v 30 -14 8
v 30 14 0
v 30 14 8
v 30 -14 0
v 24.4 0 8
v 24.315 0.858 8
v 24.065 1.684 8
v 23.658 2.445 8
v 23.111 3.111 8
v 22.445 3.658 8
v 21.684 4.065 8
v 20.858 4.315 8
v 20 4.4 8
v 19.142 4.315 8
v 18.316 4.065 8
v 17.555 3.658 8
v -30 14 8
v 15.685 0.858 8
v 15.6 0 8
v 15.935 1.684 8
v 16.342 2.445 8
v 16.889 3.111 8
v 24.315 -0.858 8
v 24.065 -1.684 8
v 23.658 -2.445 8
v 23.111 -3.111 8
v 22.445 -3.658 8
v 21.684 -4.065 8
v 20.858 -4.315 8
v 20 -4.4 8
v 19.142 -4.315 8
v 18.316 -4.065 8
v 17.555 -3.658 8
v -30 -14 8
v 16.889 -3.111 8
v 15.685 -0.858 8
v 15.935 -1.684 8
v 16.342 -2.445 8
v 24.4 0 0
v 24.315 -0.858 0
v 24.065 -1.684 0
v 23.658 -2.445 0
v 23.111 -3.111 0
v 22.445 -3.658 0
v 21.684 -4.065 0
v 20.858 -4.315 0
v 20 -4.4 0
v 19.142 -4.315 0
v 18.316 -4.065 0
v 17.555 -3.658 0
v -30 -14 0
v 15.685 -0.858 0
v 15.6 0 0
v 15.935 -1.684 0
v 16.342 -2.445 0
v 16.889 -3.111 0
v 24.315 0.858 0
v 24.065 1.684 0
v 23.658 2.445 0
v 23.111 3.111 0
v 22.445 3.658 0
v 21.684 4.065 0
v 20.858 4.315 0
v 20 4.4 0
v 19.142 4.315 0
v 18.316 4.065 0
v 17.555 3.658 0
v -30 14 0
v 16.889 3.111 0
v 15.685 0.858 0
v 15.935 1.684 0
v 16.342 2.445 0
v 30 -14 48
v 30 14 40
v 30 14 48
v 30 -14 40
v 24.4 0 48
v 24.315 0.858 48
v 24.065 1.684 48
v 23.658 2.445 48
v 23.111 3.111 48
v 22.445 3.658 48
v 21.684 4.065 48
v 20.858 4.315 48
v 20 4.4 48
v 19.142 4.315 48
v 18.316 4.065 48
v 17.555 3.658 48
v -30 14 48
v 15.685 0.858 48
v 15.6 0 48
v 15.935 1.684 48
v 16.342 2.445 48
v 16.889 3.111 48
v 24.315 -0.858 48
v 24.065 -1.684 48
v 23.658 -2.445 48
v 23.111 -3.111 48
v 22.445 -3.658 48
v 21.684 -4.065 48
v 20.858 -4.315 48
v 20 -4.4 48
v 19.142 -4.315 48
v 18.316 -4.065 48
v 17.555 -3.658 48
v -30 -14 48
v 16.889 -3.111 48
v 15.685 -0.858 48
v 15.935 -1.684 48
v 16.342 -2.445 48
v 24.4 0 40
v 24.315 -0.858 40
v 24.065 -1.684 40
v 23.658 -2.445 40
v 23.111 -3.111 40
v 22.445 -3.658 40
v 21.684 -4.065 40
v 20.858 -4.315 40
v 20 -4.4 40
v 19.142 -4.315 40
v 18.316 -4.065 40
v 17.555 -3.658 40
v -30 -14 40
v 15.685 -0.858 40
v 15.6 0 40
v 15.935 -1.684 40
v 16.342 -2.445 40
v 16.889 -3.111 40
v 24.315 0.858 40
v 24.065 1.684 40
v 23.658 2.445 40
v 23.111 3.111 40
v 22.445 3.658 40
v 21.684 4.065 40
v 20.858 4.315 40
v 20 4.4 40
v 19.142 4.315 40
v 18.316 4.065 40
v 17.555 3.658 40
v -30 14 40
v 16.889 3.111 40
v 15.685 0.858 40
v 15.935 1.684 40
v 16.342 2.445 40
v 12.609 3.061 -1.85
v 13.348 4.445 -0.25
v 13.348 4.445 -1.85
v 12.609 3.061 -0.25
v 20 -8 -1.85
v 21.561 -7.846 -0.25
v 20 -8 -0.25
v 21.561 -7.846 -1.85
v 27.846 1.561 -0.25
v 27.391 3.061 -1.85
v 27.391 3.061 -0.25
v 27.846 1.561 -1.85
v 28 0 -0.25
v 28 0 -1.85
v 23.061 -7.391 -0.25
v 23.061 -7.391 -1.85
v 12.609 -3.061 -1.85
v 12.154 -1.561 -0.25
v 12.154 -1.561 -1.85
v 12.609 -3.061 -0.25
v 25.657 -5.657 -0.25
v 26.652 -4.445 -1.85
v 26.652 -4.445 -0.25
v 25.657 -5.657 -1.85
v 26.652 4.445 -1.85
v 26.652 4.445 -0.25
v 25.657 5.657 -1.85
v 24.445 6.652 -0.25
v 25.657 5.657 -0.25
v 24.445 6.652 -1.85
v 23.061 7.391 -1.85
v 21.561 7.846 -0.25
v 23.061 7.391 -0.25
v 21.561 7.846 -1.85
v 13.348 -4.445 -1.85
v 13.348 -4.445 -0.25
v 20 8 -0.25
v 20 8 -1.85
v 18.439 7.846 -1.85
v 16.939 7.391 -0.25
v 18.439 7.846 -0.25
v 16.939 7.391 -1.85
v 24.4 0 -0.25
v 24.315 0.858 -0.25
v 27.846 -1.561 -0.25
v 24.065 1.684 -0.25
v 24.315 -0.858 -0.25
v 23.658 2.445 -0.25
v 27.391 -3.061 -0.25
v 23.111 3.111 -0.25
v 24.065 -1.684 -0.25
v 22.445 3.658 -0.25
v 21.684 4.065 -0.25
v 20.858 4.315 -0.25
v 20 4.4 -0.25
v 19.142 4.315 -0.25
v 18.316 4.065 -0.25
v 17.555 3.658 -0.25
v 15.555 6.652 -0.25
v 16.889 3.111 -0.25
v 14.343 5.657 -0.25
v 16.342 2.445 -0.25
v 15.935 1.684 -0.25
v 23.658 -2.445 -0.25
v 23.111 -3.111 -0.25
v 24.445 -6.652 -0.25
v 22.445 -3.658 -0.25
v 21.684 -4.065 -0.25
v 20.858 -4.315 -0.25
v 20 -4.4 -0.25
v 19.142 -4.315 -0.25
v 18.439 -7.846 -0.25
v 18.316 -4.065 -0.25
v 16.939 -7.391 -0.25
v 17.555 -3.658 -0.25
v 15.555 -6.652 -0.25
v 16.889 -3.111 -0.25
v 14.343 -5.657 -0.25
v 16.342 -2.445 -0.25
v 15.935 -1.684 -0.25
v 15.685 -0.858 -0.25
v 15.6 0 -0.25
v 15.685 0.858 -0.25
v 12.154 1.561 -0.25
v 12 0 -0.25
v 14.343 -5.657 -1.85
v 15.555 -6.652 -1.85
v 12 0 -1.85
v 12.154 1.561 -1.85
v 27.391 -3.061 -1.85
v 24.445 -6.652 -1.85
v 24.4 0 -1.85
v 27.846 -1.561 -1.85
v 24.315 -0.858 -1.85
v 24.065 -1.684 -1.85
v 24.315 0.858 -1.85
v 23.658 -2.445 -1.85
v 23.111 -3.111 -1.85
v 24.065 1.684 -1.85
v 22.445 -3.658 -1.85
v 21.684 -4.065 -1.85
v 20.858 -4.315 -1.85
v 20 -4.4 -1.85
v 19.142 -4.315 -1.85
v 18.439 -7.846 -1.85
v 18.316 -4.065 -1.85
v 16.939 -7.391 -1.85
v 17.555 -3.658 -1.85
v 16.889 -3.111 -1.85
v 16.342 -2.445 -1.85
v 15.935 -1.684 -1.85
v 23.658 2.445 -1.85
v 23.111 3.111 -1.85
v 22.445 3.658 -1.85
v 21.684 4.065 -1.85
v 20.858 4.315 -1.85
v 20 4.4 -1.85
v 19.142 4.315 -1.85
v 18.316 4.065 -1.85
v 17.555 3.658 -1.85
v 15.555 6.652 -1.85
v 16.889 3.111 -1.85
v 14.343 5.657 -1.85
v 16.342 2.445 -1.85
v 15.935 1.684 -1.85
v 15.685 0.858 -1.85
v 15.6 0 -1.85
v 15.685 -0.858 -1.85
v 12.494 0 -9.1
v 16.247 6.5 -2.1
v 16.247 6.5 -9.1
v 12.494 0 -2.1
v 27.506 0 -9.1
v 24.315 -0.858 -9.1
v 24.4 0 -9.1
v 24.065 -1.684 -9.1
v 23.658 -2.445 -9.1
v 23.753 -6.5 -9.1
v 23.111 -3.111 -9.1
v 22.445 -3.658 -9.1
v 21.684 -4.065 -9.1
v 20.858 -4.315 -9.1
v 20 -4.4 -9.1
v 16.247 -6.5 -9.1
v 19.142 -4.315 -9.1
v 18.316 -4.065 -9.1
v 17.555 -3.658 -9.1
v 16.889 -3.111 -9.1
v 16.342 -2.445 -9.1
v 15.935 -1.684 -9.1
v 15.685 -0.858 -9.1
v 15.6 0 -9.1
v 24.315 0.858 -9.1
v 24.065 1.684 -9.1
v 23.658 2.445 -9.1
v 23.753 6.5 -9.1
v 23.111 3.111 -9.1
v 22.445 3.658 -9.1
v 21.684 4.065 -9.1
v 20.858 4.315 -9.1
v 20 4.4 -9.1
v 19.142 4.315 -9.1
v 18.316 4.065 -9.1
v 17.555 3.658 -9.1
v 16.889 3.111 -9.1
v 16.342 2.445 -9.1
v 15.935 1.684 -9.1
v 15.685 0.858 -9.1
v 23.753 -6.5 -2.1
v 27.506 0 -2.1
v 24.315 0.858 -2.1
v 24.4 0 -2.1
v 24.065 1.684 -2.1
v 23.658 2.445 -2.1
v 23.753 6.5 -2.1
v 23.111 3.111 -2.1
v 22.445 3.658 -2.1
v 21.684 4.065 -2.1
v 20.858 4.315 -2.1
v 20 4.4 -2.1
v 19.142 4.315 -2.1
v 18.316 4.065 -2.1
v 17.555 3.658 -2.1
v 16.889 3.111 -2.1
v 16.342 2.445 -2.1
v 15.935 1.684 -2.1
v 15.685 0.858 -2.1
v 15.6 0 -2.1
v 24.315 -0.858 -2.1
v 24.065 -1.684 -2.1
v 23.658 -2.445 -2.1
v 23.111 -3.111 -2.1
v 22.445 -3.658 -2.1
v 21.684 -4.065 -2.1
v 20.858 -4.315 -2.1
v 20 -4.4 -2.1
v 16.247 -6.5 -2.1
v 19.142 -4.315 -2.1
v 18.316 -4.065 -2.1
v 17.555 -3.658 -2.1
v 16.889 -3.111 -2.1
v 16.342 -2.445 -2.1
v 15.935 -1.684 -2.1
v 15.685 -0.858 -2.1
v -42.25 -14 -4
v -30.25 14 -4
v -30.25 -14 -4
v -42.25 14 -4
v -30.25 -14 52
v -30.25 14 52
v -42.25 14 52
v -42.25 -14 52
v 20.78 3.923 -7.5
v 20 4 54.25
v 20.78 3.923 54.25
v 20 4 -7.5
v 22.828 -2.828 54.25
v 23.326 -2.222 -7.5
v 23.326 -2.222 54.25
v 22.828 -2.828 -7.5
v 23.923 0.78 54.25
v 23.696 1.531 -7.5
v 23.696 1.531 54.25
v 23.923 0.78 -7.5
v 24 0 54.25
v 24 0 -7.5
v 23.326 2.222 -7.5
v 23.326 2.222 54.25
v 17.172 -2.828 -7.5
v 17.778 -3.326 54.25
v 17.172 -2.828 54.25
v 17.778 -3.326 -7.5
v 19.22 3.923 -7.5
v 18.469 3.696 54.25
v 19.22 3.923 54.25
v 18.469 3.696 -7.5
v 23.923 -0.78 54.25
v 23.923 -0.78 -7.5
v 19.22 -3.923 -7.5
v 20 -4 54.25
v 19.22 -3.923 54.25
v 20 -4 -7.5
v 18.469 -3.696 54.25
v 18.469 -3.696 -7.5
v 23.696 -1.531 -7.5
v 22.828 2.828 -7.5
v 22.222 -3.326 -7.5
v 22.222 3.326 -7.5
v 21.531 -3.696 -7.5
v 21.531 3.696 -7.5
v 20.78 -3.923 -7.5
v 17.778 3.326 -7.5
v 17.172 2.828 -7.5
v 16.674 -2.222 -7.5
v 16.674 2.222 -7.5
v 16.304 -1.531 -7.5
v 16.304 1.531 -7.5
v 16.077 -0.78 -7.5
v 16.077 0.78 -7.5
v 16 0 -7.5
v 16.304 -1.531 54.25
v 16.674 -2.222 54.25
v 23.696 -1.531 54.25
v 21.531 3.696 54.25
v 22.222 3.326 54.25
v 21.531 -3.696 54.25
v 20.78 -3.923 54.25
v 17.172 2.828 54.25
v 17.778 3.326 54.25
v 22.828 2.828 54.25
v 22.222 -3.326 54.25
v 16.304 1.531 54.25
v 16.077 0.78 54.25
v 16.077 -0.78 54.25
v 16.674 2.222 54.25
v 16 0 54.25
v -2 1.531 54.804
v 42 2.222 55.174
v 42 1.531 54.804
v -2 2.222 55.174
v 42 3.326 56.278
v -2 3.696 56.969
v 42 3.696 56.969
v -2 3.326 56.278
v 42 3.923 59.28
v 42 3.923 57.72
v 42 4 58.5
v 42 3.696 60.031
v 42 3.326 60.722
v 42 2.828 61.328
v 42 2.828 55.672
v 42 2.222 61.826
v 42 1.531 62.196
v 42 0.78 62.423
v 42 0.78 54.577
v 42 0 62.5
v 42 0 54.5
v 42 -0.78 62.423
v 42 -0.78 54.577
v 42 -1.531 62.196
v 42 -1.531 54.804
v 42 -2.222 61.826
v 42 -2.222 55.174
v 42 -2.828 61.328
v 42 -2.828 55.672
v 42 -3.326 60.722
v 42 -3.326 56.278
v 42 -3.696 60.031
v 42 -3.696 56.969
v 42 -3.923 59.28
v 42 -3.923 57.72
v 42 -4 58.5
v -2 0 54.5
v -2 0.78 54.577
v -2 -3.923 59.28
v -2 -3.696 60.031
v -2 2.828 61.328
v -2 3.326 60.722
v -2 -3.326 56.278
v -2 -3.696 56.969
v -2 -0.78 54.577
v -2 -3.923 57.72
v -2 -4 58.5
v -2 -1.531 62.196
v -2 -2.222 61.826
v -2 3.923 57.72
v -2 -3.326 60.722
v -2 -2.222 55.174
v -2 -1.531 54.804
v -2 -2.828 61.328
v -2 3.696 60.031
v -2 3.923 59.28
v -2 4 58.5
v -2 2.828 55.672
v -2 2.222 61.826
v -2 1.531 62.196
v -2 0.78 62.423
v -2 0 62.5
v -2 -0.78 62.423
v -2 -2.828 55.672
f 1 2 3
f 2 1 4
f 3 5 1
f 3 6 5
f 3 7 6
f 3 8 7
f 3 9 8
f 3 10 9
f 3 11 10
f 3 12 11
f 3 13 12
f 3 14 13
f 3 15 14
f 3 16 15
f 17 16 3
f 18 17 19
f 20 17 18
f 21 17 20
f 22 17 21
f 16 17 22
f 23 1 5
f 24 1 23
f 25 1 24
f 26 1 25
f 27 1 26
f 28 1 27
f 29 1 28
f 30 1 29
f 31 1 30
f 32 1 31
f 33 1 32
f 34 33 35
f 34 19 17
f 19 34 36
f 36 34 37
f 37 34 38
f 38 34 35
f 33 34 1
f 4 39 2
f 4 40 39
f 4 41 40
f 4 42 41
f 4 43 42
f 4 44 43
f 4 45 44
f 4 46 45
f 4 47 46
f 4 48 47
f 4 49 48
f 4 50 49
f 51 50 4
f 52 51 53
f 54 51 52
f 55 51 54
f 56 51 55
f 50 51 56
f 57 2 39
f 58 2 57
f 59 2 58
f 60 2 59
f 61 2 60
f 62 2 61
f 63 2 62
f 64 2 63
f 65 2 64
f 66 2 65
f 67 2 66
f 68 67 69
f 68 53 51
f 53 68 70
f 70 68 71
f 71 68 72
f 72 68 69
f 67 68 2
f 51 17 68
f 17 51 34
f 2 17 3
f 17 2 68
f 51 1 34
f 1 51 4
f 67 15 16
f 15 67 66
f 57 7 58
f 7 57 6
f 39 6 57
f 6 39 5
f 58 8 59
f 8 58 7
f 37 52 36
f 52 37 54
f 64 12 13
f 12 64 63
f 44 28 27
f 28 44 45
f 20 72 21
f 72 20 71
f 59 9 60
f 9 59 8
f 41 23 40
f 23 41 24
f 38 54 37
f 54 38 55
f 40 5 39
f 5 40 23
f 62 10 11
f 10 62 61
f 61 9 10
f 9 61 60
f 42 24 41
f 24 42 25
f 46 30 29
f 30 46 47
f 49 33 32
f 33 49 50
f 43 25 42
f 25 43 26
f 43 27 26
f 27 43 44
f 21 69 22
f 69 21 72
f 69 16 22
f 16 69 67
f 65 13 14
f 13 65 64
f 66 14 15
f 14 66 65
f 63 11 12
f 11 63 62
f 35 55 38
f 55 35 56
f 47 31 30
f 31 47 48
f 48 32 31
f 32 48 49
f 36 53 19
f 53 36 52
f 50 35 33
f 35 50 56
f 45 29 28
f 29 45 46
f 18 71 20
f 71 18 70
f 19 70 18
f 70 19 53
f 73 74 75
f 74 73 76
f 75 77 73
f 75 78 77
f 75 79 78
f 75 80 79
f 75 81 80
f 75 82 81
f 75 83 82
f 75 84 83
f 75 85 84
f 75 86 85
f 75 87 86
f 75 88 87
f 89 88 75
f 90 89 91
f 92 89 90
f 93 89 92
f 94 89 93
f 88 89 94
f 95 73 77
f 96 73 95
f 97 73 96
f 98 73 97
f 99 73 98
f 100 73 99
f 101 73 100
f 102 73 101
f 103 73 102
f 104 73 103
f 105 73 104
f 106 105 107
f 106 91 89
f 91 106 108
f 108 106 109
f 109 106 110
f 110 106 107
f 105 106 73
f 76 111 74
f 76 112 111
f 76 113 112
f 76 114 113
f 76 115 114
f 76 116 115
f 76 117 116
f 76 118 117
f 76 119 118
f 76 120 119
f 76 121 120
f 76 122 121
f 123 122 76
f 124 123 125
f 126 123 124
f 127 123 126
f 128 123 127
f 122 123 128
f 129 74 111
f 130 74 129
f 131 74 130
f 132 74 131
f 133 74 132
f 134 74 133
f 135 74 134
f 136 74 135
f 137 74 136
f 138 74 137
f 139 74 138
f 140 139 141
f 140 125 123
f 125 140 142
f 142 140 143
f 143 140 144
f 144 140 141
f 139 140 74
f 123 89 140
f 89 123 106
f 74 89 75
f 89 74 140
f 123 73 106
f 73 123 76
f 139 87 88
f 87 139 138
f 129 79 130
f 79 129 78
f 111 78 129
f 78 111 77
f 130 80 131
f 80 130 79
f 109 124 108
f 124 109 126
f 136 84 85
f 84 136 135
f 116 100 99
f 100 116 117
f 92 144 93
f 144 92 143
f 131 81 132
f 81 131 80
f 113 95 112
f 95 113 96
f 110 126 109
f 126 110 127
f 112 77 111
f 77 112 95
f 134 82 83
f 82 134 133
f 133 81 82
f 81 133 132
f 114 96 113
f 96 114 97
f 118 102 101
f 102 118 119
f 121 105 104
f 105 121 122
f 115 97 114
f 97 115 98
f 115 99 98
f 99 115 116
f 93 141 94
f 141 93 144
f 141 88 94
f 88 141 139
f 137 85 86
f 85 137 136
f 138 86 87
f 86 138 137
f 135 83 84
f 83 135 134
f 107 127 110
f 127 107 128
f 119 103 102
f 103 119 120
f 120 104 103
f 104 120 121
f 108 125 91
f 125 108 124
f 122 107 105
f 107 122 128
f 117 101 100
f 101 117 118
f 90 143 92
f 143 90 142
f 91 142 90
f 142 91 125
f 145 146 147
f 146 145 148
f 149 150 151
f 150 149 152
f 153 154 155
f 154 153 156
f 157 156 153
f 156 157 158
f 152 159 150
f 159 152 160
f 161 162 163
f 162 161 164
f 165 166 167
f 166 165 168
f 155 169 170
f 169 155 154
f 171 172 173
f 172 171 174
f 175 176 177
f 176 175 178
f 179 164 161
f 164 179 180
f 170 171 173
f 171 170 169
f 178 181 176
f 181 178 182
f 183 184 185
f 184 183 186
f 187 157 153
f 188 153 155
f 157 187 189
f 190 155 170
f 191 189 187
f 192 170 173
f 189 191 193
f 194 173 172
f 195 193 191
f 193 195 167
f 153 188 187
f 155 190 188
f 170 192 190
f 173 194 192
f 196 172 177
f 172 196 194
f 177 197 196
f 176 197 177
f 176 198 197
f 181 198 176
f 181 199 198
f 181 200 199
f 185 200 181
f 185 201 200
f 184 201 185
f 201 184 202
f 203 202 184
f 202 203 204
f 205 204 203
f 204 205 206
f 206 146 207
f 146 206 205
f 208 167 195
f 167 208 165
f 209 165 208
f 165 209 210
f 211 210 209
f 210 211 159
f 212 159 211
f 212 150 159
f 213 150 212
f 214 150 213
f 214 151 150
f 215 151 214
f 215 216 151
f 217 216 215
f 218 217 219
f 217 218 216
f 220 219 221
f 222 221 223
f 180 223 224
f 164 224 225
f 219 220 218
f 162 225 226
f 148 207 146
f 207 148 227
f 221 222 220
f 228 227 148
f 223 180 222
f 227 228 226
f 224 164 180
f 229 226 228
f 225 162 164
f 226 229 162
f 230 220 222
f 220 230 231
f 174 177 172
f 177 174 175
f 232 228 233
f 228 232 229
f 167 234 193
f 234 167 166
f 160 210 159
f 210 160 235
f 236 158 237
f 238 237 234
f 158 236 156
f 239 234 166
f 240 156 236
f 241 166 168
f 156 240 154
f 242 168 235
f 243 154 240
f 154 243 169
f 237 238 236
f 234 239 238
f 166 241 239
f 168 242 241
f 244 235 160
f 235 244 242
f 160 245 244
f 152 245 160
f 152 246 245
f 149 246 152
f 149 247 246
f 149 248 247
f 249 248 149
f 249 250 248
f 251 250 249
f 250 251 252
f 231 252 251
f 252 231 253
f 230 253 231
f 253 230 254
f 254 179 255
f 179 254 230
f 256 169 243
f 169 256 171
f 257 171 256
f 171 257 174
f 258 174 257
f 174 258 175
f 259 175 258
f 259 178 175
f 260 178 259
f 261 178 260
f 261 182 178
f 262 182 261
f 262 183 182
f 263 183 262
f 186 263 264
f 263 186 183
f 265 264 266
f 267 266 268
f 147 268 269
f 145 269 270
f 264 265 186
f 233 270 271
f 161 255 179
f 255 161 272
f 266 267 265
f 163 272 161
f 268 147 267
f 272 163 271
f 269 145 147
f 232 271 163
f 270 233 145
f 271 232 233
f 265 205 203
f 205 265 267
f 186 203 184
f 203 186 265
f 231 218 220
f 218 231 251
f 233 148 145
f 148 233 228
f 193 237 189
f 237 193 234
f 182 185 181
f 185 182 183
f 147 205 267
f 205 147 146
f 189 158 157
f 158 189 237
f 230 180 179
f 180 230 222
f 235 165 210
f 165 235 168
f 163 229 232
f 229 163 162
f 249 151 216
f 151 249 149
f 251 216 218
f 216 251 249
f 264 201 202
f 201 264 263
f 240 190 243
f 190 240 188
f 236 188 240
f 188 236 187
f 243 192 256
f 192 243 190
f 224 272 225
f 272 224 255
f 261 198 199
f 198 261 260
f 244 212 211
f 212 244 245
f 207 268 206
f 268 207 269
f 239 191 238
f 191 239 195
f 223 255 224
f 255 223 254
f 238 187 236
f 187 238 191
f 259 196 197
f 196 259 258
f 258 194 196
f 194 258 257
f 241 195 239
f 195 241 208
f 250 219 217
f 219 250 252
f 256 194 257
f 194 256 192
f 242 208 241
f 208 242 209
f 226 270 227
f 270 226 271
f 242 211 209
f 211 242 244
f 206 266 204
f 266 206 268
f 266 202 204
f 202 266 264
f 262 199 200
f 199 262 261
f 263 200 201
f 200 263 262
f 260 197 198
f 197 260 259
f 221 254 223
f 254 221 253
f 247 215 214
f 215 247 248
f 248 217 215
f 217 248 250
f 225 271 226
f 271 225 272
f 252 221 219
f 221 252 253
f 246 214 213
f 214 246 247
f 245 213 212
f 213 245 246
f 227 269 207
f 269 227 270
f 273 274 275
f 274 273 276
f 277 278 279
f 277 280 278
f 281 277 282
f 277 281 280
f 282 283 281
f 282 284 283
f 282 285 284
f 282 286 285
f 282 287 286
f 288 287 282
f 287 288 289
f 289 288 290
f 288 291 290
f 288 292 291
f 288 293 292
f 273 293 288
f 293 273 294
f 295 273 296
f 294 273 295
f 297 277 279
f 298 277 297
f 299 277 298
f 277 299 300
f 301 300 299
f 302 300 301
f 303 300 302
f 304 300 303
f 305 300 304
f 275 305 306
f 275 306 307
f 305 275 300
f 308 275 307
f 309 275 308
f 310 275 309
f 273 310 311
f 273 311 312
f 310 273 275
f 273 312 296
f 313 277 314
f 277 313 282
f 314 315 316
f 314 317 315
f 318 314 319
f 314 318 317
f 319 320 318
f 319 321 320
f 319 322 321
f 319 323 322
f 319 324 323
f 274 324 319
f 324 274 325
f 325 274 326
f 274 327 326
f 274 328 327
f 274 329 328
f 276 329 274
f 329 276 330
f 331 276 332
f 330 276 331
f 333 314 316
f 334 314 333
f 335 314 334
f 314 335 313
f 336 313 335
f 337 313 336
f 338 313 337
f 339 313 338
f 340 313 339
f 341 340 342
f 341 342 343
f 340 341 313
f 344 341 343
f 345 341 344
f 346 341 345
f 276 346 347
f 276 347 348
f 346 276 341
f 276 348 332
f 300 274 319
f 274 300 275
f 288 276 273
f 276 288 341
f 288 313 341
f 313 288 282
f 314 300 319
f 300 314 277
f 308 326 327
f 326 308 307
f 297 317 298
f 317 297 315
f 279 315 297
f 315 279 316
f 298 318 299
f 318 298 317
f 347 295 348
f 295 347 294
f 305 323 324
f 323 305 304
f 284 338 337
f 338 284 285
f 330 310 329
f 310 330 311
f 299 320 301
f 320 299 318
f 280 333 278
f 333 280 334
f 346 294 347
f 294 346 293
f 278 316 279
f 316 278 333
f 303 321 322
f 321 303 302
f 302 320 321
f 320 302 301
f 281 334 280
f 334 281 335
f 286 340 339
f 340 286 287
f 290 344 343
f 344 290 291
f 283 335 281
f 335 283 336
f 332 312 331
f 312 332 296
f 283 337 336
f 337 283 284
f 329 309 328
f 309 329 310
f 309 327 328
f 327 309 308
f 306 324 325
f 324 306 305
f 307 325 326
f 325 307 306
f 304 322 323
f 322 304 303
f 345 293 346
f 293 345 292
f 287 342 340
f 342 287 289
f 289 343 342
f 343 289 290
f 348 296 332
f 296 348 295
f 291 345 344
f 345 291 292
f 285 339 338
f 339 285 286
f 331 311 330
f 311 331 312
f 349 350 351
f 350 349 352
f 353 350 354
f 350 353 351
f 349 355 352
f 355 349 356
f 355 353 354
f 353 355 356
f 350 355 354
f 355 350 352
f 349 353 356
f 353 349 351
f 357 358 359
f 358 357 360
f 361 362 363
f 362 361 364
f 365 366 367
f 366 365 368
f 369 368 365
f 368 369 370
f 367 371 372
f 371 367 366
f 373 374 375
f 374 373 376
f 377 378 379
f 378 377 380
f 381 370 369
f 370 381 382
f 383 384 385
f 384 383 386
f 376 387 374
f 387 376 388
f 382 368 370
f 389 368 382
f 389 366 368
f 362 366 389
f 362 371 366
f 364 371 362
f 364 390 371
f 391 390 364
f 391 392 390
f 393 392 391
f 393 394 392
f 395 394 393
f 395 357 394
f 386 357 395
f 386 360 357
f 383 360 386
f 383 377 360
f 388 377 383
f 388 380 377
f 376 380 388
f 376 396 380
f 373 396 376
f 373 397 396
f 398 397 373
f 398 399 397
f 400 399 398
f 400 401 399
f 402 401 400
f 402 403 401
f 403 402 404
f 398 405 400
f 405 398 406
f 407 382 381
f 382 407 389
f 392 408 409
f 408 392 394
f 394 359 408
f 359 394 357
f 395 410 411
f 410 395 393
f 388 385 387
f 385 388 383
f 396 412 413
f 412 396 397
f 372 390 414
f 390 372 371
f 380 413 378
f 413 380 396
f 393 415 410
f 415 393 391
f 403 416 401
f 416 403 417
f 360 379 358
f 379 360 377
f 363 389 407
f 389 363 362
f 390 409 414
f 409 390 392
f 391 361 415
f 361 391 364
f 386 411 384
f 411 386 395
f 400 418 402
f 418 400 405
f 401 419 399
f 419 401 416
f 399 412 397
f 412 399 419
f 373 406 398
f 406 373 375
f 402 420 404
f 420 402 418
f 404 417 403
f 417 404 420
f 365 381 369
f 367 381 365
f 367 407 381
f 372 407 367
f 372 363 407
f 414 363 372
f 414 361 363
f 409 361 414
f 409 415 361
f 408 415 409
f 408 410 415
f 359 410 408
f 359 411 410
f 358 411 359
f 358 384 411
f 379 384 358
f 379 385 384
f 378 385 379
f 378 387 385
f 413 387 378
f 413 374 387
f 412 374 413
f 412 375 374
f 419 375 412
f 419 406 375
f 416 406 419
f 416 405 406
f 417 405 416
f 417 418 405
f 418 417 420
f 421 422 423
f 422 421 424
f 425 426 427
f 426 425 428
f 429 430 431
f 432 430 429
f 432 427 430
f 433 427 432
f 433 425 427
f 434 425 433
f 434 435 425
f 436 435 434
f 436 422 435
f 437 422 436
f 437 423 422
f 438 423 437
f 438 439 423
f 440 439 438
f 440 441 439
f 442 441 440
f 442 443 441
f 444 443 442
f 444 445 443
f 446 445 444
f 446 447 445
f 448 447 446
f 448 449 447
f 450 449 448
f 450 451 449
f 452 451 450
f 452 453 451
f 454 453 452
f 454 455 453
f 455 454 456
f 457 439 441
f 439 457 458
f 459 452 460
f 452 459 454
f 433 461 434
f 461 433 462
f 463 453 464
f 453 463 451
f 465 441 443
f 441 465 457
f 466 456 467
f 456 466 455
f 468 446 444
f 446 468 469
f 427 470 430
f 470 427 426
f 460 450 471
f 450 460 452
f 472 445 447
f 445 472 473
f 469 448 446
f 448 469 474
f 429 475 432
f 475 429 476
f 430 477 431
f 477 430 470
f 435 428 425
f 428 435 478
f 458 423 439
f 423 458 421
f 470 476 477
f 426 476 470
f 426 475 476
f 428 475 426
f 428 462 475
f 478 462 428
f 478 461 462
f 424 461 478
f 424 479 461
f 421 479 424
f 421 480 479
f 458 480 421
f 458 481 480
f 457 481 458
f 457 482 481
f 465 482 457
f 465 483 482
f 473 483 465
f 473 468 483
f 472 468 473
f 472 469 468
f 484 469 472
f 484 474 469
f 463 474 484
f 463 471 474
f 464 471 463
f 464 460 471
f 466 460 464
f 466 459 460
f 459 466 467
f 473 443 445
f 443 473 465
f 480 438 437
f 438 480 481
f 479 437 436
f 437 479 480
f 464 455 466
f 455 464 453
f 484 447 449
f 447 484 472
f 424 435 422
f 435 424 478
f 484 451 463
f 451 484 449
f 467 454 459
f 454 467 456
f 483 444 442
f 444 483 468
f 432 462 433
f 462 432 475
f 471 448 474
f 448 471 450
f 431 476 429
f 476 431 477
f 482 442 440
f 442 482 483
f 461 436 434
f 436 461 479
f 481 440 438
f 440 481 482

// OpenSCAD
$fn = 32;

// ------------------------------------------------------------------------
// C clamp: throat 40 mm, screw d8
// Every part is its own module, assembly() places every instance.
// ------------------------------------------------------------------------

// --- part 1 ---
module clamp_arm() {
  difference() {
    translate([-30, -14, 0]) cube([60, 28, 8]);
    translate([20, 0, -1]) cylinder(h = 10, d = 8.8);
  }
}

// --- part 2 ---
module clamp_spine() {
  difference() {
    translate([-28, -14, 0]) cube([56, 28, 12]);
  }
}

// --- part 3 ---
module clamp_screw() {
  translate([0, 0, -30.875]) cylinder(h = 61.75, d = 8);
}

// --- part 4 ---
module clamp_washer() {
  difference() {
      translate([0, 0, 0]) cylinder(h = 1.6, d = 16);
      translate([0, 0, -1]) cylinder(h = 3.6, d = 8.8);
    }
}

// --- part 5 ---
module clamp_nut() {
  difference() {
    linear_extrude(height = 7) polygon(points = [[7.506, 0], [3.753, 6.5], [-3.753, 6.5], [-7.506, 0], [-3.753, -6.5], [3.753, -6.5]]);
    translate([0, 0, -1]) cylinder(h = 9, d = 8.8);
  }
}

// --- part 6 ---
module tommy_bar() {
  translate([0, 0, -22]) cylinder(h = 44, d = 8);
}

// --- assembly ---
module assembly() {
  color([0.80, 0.24, 0.20]) translate([0, 0, 0]) rotate([0, 0, 0]) clamp_arm();
  color([0.20, 0.45, 0.75]) translate([0, 0, 40]) rotate([0, 0, 0]) clamp_arm();
  color([0.25, 0.62, 0.32]) translate([-42.25, 0, 24]) rotate([0, 90, 0]) clamp_spine();
  color([0.92, 0.70, 0.18]) translate([20, 0, 23.375]) rotate([0, 0, 0]) clamp_screw();
  color([0.58, 0.35, 0.70]) translate([20, 0, -1.85]) rotate([0, 0, 0]) clamp_washer();
  color([0.16, 0.66, 0.66]) translate([20, 0, -9.1]) rotate([0, 0, 0]) clamp_nut();
  color([0.85, 0.48, 0.18]) translate([20, 0, 58.5]) rotate([0, 90, 0]) tommy_bar();
}

assembly();
